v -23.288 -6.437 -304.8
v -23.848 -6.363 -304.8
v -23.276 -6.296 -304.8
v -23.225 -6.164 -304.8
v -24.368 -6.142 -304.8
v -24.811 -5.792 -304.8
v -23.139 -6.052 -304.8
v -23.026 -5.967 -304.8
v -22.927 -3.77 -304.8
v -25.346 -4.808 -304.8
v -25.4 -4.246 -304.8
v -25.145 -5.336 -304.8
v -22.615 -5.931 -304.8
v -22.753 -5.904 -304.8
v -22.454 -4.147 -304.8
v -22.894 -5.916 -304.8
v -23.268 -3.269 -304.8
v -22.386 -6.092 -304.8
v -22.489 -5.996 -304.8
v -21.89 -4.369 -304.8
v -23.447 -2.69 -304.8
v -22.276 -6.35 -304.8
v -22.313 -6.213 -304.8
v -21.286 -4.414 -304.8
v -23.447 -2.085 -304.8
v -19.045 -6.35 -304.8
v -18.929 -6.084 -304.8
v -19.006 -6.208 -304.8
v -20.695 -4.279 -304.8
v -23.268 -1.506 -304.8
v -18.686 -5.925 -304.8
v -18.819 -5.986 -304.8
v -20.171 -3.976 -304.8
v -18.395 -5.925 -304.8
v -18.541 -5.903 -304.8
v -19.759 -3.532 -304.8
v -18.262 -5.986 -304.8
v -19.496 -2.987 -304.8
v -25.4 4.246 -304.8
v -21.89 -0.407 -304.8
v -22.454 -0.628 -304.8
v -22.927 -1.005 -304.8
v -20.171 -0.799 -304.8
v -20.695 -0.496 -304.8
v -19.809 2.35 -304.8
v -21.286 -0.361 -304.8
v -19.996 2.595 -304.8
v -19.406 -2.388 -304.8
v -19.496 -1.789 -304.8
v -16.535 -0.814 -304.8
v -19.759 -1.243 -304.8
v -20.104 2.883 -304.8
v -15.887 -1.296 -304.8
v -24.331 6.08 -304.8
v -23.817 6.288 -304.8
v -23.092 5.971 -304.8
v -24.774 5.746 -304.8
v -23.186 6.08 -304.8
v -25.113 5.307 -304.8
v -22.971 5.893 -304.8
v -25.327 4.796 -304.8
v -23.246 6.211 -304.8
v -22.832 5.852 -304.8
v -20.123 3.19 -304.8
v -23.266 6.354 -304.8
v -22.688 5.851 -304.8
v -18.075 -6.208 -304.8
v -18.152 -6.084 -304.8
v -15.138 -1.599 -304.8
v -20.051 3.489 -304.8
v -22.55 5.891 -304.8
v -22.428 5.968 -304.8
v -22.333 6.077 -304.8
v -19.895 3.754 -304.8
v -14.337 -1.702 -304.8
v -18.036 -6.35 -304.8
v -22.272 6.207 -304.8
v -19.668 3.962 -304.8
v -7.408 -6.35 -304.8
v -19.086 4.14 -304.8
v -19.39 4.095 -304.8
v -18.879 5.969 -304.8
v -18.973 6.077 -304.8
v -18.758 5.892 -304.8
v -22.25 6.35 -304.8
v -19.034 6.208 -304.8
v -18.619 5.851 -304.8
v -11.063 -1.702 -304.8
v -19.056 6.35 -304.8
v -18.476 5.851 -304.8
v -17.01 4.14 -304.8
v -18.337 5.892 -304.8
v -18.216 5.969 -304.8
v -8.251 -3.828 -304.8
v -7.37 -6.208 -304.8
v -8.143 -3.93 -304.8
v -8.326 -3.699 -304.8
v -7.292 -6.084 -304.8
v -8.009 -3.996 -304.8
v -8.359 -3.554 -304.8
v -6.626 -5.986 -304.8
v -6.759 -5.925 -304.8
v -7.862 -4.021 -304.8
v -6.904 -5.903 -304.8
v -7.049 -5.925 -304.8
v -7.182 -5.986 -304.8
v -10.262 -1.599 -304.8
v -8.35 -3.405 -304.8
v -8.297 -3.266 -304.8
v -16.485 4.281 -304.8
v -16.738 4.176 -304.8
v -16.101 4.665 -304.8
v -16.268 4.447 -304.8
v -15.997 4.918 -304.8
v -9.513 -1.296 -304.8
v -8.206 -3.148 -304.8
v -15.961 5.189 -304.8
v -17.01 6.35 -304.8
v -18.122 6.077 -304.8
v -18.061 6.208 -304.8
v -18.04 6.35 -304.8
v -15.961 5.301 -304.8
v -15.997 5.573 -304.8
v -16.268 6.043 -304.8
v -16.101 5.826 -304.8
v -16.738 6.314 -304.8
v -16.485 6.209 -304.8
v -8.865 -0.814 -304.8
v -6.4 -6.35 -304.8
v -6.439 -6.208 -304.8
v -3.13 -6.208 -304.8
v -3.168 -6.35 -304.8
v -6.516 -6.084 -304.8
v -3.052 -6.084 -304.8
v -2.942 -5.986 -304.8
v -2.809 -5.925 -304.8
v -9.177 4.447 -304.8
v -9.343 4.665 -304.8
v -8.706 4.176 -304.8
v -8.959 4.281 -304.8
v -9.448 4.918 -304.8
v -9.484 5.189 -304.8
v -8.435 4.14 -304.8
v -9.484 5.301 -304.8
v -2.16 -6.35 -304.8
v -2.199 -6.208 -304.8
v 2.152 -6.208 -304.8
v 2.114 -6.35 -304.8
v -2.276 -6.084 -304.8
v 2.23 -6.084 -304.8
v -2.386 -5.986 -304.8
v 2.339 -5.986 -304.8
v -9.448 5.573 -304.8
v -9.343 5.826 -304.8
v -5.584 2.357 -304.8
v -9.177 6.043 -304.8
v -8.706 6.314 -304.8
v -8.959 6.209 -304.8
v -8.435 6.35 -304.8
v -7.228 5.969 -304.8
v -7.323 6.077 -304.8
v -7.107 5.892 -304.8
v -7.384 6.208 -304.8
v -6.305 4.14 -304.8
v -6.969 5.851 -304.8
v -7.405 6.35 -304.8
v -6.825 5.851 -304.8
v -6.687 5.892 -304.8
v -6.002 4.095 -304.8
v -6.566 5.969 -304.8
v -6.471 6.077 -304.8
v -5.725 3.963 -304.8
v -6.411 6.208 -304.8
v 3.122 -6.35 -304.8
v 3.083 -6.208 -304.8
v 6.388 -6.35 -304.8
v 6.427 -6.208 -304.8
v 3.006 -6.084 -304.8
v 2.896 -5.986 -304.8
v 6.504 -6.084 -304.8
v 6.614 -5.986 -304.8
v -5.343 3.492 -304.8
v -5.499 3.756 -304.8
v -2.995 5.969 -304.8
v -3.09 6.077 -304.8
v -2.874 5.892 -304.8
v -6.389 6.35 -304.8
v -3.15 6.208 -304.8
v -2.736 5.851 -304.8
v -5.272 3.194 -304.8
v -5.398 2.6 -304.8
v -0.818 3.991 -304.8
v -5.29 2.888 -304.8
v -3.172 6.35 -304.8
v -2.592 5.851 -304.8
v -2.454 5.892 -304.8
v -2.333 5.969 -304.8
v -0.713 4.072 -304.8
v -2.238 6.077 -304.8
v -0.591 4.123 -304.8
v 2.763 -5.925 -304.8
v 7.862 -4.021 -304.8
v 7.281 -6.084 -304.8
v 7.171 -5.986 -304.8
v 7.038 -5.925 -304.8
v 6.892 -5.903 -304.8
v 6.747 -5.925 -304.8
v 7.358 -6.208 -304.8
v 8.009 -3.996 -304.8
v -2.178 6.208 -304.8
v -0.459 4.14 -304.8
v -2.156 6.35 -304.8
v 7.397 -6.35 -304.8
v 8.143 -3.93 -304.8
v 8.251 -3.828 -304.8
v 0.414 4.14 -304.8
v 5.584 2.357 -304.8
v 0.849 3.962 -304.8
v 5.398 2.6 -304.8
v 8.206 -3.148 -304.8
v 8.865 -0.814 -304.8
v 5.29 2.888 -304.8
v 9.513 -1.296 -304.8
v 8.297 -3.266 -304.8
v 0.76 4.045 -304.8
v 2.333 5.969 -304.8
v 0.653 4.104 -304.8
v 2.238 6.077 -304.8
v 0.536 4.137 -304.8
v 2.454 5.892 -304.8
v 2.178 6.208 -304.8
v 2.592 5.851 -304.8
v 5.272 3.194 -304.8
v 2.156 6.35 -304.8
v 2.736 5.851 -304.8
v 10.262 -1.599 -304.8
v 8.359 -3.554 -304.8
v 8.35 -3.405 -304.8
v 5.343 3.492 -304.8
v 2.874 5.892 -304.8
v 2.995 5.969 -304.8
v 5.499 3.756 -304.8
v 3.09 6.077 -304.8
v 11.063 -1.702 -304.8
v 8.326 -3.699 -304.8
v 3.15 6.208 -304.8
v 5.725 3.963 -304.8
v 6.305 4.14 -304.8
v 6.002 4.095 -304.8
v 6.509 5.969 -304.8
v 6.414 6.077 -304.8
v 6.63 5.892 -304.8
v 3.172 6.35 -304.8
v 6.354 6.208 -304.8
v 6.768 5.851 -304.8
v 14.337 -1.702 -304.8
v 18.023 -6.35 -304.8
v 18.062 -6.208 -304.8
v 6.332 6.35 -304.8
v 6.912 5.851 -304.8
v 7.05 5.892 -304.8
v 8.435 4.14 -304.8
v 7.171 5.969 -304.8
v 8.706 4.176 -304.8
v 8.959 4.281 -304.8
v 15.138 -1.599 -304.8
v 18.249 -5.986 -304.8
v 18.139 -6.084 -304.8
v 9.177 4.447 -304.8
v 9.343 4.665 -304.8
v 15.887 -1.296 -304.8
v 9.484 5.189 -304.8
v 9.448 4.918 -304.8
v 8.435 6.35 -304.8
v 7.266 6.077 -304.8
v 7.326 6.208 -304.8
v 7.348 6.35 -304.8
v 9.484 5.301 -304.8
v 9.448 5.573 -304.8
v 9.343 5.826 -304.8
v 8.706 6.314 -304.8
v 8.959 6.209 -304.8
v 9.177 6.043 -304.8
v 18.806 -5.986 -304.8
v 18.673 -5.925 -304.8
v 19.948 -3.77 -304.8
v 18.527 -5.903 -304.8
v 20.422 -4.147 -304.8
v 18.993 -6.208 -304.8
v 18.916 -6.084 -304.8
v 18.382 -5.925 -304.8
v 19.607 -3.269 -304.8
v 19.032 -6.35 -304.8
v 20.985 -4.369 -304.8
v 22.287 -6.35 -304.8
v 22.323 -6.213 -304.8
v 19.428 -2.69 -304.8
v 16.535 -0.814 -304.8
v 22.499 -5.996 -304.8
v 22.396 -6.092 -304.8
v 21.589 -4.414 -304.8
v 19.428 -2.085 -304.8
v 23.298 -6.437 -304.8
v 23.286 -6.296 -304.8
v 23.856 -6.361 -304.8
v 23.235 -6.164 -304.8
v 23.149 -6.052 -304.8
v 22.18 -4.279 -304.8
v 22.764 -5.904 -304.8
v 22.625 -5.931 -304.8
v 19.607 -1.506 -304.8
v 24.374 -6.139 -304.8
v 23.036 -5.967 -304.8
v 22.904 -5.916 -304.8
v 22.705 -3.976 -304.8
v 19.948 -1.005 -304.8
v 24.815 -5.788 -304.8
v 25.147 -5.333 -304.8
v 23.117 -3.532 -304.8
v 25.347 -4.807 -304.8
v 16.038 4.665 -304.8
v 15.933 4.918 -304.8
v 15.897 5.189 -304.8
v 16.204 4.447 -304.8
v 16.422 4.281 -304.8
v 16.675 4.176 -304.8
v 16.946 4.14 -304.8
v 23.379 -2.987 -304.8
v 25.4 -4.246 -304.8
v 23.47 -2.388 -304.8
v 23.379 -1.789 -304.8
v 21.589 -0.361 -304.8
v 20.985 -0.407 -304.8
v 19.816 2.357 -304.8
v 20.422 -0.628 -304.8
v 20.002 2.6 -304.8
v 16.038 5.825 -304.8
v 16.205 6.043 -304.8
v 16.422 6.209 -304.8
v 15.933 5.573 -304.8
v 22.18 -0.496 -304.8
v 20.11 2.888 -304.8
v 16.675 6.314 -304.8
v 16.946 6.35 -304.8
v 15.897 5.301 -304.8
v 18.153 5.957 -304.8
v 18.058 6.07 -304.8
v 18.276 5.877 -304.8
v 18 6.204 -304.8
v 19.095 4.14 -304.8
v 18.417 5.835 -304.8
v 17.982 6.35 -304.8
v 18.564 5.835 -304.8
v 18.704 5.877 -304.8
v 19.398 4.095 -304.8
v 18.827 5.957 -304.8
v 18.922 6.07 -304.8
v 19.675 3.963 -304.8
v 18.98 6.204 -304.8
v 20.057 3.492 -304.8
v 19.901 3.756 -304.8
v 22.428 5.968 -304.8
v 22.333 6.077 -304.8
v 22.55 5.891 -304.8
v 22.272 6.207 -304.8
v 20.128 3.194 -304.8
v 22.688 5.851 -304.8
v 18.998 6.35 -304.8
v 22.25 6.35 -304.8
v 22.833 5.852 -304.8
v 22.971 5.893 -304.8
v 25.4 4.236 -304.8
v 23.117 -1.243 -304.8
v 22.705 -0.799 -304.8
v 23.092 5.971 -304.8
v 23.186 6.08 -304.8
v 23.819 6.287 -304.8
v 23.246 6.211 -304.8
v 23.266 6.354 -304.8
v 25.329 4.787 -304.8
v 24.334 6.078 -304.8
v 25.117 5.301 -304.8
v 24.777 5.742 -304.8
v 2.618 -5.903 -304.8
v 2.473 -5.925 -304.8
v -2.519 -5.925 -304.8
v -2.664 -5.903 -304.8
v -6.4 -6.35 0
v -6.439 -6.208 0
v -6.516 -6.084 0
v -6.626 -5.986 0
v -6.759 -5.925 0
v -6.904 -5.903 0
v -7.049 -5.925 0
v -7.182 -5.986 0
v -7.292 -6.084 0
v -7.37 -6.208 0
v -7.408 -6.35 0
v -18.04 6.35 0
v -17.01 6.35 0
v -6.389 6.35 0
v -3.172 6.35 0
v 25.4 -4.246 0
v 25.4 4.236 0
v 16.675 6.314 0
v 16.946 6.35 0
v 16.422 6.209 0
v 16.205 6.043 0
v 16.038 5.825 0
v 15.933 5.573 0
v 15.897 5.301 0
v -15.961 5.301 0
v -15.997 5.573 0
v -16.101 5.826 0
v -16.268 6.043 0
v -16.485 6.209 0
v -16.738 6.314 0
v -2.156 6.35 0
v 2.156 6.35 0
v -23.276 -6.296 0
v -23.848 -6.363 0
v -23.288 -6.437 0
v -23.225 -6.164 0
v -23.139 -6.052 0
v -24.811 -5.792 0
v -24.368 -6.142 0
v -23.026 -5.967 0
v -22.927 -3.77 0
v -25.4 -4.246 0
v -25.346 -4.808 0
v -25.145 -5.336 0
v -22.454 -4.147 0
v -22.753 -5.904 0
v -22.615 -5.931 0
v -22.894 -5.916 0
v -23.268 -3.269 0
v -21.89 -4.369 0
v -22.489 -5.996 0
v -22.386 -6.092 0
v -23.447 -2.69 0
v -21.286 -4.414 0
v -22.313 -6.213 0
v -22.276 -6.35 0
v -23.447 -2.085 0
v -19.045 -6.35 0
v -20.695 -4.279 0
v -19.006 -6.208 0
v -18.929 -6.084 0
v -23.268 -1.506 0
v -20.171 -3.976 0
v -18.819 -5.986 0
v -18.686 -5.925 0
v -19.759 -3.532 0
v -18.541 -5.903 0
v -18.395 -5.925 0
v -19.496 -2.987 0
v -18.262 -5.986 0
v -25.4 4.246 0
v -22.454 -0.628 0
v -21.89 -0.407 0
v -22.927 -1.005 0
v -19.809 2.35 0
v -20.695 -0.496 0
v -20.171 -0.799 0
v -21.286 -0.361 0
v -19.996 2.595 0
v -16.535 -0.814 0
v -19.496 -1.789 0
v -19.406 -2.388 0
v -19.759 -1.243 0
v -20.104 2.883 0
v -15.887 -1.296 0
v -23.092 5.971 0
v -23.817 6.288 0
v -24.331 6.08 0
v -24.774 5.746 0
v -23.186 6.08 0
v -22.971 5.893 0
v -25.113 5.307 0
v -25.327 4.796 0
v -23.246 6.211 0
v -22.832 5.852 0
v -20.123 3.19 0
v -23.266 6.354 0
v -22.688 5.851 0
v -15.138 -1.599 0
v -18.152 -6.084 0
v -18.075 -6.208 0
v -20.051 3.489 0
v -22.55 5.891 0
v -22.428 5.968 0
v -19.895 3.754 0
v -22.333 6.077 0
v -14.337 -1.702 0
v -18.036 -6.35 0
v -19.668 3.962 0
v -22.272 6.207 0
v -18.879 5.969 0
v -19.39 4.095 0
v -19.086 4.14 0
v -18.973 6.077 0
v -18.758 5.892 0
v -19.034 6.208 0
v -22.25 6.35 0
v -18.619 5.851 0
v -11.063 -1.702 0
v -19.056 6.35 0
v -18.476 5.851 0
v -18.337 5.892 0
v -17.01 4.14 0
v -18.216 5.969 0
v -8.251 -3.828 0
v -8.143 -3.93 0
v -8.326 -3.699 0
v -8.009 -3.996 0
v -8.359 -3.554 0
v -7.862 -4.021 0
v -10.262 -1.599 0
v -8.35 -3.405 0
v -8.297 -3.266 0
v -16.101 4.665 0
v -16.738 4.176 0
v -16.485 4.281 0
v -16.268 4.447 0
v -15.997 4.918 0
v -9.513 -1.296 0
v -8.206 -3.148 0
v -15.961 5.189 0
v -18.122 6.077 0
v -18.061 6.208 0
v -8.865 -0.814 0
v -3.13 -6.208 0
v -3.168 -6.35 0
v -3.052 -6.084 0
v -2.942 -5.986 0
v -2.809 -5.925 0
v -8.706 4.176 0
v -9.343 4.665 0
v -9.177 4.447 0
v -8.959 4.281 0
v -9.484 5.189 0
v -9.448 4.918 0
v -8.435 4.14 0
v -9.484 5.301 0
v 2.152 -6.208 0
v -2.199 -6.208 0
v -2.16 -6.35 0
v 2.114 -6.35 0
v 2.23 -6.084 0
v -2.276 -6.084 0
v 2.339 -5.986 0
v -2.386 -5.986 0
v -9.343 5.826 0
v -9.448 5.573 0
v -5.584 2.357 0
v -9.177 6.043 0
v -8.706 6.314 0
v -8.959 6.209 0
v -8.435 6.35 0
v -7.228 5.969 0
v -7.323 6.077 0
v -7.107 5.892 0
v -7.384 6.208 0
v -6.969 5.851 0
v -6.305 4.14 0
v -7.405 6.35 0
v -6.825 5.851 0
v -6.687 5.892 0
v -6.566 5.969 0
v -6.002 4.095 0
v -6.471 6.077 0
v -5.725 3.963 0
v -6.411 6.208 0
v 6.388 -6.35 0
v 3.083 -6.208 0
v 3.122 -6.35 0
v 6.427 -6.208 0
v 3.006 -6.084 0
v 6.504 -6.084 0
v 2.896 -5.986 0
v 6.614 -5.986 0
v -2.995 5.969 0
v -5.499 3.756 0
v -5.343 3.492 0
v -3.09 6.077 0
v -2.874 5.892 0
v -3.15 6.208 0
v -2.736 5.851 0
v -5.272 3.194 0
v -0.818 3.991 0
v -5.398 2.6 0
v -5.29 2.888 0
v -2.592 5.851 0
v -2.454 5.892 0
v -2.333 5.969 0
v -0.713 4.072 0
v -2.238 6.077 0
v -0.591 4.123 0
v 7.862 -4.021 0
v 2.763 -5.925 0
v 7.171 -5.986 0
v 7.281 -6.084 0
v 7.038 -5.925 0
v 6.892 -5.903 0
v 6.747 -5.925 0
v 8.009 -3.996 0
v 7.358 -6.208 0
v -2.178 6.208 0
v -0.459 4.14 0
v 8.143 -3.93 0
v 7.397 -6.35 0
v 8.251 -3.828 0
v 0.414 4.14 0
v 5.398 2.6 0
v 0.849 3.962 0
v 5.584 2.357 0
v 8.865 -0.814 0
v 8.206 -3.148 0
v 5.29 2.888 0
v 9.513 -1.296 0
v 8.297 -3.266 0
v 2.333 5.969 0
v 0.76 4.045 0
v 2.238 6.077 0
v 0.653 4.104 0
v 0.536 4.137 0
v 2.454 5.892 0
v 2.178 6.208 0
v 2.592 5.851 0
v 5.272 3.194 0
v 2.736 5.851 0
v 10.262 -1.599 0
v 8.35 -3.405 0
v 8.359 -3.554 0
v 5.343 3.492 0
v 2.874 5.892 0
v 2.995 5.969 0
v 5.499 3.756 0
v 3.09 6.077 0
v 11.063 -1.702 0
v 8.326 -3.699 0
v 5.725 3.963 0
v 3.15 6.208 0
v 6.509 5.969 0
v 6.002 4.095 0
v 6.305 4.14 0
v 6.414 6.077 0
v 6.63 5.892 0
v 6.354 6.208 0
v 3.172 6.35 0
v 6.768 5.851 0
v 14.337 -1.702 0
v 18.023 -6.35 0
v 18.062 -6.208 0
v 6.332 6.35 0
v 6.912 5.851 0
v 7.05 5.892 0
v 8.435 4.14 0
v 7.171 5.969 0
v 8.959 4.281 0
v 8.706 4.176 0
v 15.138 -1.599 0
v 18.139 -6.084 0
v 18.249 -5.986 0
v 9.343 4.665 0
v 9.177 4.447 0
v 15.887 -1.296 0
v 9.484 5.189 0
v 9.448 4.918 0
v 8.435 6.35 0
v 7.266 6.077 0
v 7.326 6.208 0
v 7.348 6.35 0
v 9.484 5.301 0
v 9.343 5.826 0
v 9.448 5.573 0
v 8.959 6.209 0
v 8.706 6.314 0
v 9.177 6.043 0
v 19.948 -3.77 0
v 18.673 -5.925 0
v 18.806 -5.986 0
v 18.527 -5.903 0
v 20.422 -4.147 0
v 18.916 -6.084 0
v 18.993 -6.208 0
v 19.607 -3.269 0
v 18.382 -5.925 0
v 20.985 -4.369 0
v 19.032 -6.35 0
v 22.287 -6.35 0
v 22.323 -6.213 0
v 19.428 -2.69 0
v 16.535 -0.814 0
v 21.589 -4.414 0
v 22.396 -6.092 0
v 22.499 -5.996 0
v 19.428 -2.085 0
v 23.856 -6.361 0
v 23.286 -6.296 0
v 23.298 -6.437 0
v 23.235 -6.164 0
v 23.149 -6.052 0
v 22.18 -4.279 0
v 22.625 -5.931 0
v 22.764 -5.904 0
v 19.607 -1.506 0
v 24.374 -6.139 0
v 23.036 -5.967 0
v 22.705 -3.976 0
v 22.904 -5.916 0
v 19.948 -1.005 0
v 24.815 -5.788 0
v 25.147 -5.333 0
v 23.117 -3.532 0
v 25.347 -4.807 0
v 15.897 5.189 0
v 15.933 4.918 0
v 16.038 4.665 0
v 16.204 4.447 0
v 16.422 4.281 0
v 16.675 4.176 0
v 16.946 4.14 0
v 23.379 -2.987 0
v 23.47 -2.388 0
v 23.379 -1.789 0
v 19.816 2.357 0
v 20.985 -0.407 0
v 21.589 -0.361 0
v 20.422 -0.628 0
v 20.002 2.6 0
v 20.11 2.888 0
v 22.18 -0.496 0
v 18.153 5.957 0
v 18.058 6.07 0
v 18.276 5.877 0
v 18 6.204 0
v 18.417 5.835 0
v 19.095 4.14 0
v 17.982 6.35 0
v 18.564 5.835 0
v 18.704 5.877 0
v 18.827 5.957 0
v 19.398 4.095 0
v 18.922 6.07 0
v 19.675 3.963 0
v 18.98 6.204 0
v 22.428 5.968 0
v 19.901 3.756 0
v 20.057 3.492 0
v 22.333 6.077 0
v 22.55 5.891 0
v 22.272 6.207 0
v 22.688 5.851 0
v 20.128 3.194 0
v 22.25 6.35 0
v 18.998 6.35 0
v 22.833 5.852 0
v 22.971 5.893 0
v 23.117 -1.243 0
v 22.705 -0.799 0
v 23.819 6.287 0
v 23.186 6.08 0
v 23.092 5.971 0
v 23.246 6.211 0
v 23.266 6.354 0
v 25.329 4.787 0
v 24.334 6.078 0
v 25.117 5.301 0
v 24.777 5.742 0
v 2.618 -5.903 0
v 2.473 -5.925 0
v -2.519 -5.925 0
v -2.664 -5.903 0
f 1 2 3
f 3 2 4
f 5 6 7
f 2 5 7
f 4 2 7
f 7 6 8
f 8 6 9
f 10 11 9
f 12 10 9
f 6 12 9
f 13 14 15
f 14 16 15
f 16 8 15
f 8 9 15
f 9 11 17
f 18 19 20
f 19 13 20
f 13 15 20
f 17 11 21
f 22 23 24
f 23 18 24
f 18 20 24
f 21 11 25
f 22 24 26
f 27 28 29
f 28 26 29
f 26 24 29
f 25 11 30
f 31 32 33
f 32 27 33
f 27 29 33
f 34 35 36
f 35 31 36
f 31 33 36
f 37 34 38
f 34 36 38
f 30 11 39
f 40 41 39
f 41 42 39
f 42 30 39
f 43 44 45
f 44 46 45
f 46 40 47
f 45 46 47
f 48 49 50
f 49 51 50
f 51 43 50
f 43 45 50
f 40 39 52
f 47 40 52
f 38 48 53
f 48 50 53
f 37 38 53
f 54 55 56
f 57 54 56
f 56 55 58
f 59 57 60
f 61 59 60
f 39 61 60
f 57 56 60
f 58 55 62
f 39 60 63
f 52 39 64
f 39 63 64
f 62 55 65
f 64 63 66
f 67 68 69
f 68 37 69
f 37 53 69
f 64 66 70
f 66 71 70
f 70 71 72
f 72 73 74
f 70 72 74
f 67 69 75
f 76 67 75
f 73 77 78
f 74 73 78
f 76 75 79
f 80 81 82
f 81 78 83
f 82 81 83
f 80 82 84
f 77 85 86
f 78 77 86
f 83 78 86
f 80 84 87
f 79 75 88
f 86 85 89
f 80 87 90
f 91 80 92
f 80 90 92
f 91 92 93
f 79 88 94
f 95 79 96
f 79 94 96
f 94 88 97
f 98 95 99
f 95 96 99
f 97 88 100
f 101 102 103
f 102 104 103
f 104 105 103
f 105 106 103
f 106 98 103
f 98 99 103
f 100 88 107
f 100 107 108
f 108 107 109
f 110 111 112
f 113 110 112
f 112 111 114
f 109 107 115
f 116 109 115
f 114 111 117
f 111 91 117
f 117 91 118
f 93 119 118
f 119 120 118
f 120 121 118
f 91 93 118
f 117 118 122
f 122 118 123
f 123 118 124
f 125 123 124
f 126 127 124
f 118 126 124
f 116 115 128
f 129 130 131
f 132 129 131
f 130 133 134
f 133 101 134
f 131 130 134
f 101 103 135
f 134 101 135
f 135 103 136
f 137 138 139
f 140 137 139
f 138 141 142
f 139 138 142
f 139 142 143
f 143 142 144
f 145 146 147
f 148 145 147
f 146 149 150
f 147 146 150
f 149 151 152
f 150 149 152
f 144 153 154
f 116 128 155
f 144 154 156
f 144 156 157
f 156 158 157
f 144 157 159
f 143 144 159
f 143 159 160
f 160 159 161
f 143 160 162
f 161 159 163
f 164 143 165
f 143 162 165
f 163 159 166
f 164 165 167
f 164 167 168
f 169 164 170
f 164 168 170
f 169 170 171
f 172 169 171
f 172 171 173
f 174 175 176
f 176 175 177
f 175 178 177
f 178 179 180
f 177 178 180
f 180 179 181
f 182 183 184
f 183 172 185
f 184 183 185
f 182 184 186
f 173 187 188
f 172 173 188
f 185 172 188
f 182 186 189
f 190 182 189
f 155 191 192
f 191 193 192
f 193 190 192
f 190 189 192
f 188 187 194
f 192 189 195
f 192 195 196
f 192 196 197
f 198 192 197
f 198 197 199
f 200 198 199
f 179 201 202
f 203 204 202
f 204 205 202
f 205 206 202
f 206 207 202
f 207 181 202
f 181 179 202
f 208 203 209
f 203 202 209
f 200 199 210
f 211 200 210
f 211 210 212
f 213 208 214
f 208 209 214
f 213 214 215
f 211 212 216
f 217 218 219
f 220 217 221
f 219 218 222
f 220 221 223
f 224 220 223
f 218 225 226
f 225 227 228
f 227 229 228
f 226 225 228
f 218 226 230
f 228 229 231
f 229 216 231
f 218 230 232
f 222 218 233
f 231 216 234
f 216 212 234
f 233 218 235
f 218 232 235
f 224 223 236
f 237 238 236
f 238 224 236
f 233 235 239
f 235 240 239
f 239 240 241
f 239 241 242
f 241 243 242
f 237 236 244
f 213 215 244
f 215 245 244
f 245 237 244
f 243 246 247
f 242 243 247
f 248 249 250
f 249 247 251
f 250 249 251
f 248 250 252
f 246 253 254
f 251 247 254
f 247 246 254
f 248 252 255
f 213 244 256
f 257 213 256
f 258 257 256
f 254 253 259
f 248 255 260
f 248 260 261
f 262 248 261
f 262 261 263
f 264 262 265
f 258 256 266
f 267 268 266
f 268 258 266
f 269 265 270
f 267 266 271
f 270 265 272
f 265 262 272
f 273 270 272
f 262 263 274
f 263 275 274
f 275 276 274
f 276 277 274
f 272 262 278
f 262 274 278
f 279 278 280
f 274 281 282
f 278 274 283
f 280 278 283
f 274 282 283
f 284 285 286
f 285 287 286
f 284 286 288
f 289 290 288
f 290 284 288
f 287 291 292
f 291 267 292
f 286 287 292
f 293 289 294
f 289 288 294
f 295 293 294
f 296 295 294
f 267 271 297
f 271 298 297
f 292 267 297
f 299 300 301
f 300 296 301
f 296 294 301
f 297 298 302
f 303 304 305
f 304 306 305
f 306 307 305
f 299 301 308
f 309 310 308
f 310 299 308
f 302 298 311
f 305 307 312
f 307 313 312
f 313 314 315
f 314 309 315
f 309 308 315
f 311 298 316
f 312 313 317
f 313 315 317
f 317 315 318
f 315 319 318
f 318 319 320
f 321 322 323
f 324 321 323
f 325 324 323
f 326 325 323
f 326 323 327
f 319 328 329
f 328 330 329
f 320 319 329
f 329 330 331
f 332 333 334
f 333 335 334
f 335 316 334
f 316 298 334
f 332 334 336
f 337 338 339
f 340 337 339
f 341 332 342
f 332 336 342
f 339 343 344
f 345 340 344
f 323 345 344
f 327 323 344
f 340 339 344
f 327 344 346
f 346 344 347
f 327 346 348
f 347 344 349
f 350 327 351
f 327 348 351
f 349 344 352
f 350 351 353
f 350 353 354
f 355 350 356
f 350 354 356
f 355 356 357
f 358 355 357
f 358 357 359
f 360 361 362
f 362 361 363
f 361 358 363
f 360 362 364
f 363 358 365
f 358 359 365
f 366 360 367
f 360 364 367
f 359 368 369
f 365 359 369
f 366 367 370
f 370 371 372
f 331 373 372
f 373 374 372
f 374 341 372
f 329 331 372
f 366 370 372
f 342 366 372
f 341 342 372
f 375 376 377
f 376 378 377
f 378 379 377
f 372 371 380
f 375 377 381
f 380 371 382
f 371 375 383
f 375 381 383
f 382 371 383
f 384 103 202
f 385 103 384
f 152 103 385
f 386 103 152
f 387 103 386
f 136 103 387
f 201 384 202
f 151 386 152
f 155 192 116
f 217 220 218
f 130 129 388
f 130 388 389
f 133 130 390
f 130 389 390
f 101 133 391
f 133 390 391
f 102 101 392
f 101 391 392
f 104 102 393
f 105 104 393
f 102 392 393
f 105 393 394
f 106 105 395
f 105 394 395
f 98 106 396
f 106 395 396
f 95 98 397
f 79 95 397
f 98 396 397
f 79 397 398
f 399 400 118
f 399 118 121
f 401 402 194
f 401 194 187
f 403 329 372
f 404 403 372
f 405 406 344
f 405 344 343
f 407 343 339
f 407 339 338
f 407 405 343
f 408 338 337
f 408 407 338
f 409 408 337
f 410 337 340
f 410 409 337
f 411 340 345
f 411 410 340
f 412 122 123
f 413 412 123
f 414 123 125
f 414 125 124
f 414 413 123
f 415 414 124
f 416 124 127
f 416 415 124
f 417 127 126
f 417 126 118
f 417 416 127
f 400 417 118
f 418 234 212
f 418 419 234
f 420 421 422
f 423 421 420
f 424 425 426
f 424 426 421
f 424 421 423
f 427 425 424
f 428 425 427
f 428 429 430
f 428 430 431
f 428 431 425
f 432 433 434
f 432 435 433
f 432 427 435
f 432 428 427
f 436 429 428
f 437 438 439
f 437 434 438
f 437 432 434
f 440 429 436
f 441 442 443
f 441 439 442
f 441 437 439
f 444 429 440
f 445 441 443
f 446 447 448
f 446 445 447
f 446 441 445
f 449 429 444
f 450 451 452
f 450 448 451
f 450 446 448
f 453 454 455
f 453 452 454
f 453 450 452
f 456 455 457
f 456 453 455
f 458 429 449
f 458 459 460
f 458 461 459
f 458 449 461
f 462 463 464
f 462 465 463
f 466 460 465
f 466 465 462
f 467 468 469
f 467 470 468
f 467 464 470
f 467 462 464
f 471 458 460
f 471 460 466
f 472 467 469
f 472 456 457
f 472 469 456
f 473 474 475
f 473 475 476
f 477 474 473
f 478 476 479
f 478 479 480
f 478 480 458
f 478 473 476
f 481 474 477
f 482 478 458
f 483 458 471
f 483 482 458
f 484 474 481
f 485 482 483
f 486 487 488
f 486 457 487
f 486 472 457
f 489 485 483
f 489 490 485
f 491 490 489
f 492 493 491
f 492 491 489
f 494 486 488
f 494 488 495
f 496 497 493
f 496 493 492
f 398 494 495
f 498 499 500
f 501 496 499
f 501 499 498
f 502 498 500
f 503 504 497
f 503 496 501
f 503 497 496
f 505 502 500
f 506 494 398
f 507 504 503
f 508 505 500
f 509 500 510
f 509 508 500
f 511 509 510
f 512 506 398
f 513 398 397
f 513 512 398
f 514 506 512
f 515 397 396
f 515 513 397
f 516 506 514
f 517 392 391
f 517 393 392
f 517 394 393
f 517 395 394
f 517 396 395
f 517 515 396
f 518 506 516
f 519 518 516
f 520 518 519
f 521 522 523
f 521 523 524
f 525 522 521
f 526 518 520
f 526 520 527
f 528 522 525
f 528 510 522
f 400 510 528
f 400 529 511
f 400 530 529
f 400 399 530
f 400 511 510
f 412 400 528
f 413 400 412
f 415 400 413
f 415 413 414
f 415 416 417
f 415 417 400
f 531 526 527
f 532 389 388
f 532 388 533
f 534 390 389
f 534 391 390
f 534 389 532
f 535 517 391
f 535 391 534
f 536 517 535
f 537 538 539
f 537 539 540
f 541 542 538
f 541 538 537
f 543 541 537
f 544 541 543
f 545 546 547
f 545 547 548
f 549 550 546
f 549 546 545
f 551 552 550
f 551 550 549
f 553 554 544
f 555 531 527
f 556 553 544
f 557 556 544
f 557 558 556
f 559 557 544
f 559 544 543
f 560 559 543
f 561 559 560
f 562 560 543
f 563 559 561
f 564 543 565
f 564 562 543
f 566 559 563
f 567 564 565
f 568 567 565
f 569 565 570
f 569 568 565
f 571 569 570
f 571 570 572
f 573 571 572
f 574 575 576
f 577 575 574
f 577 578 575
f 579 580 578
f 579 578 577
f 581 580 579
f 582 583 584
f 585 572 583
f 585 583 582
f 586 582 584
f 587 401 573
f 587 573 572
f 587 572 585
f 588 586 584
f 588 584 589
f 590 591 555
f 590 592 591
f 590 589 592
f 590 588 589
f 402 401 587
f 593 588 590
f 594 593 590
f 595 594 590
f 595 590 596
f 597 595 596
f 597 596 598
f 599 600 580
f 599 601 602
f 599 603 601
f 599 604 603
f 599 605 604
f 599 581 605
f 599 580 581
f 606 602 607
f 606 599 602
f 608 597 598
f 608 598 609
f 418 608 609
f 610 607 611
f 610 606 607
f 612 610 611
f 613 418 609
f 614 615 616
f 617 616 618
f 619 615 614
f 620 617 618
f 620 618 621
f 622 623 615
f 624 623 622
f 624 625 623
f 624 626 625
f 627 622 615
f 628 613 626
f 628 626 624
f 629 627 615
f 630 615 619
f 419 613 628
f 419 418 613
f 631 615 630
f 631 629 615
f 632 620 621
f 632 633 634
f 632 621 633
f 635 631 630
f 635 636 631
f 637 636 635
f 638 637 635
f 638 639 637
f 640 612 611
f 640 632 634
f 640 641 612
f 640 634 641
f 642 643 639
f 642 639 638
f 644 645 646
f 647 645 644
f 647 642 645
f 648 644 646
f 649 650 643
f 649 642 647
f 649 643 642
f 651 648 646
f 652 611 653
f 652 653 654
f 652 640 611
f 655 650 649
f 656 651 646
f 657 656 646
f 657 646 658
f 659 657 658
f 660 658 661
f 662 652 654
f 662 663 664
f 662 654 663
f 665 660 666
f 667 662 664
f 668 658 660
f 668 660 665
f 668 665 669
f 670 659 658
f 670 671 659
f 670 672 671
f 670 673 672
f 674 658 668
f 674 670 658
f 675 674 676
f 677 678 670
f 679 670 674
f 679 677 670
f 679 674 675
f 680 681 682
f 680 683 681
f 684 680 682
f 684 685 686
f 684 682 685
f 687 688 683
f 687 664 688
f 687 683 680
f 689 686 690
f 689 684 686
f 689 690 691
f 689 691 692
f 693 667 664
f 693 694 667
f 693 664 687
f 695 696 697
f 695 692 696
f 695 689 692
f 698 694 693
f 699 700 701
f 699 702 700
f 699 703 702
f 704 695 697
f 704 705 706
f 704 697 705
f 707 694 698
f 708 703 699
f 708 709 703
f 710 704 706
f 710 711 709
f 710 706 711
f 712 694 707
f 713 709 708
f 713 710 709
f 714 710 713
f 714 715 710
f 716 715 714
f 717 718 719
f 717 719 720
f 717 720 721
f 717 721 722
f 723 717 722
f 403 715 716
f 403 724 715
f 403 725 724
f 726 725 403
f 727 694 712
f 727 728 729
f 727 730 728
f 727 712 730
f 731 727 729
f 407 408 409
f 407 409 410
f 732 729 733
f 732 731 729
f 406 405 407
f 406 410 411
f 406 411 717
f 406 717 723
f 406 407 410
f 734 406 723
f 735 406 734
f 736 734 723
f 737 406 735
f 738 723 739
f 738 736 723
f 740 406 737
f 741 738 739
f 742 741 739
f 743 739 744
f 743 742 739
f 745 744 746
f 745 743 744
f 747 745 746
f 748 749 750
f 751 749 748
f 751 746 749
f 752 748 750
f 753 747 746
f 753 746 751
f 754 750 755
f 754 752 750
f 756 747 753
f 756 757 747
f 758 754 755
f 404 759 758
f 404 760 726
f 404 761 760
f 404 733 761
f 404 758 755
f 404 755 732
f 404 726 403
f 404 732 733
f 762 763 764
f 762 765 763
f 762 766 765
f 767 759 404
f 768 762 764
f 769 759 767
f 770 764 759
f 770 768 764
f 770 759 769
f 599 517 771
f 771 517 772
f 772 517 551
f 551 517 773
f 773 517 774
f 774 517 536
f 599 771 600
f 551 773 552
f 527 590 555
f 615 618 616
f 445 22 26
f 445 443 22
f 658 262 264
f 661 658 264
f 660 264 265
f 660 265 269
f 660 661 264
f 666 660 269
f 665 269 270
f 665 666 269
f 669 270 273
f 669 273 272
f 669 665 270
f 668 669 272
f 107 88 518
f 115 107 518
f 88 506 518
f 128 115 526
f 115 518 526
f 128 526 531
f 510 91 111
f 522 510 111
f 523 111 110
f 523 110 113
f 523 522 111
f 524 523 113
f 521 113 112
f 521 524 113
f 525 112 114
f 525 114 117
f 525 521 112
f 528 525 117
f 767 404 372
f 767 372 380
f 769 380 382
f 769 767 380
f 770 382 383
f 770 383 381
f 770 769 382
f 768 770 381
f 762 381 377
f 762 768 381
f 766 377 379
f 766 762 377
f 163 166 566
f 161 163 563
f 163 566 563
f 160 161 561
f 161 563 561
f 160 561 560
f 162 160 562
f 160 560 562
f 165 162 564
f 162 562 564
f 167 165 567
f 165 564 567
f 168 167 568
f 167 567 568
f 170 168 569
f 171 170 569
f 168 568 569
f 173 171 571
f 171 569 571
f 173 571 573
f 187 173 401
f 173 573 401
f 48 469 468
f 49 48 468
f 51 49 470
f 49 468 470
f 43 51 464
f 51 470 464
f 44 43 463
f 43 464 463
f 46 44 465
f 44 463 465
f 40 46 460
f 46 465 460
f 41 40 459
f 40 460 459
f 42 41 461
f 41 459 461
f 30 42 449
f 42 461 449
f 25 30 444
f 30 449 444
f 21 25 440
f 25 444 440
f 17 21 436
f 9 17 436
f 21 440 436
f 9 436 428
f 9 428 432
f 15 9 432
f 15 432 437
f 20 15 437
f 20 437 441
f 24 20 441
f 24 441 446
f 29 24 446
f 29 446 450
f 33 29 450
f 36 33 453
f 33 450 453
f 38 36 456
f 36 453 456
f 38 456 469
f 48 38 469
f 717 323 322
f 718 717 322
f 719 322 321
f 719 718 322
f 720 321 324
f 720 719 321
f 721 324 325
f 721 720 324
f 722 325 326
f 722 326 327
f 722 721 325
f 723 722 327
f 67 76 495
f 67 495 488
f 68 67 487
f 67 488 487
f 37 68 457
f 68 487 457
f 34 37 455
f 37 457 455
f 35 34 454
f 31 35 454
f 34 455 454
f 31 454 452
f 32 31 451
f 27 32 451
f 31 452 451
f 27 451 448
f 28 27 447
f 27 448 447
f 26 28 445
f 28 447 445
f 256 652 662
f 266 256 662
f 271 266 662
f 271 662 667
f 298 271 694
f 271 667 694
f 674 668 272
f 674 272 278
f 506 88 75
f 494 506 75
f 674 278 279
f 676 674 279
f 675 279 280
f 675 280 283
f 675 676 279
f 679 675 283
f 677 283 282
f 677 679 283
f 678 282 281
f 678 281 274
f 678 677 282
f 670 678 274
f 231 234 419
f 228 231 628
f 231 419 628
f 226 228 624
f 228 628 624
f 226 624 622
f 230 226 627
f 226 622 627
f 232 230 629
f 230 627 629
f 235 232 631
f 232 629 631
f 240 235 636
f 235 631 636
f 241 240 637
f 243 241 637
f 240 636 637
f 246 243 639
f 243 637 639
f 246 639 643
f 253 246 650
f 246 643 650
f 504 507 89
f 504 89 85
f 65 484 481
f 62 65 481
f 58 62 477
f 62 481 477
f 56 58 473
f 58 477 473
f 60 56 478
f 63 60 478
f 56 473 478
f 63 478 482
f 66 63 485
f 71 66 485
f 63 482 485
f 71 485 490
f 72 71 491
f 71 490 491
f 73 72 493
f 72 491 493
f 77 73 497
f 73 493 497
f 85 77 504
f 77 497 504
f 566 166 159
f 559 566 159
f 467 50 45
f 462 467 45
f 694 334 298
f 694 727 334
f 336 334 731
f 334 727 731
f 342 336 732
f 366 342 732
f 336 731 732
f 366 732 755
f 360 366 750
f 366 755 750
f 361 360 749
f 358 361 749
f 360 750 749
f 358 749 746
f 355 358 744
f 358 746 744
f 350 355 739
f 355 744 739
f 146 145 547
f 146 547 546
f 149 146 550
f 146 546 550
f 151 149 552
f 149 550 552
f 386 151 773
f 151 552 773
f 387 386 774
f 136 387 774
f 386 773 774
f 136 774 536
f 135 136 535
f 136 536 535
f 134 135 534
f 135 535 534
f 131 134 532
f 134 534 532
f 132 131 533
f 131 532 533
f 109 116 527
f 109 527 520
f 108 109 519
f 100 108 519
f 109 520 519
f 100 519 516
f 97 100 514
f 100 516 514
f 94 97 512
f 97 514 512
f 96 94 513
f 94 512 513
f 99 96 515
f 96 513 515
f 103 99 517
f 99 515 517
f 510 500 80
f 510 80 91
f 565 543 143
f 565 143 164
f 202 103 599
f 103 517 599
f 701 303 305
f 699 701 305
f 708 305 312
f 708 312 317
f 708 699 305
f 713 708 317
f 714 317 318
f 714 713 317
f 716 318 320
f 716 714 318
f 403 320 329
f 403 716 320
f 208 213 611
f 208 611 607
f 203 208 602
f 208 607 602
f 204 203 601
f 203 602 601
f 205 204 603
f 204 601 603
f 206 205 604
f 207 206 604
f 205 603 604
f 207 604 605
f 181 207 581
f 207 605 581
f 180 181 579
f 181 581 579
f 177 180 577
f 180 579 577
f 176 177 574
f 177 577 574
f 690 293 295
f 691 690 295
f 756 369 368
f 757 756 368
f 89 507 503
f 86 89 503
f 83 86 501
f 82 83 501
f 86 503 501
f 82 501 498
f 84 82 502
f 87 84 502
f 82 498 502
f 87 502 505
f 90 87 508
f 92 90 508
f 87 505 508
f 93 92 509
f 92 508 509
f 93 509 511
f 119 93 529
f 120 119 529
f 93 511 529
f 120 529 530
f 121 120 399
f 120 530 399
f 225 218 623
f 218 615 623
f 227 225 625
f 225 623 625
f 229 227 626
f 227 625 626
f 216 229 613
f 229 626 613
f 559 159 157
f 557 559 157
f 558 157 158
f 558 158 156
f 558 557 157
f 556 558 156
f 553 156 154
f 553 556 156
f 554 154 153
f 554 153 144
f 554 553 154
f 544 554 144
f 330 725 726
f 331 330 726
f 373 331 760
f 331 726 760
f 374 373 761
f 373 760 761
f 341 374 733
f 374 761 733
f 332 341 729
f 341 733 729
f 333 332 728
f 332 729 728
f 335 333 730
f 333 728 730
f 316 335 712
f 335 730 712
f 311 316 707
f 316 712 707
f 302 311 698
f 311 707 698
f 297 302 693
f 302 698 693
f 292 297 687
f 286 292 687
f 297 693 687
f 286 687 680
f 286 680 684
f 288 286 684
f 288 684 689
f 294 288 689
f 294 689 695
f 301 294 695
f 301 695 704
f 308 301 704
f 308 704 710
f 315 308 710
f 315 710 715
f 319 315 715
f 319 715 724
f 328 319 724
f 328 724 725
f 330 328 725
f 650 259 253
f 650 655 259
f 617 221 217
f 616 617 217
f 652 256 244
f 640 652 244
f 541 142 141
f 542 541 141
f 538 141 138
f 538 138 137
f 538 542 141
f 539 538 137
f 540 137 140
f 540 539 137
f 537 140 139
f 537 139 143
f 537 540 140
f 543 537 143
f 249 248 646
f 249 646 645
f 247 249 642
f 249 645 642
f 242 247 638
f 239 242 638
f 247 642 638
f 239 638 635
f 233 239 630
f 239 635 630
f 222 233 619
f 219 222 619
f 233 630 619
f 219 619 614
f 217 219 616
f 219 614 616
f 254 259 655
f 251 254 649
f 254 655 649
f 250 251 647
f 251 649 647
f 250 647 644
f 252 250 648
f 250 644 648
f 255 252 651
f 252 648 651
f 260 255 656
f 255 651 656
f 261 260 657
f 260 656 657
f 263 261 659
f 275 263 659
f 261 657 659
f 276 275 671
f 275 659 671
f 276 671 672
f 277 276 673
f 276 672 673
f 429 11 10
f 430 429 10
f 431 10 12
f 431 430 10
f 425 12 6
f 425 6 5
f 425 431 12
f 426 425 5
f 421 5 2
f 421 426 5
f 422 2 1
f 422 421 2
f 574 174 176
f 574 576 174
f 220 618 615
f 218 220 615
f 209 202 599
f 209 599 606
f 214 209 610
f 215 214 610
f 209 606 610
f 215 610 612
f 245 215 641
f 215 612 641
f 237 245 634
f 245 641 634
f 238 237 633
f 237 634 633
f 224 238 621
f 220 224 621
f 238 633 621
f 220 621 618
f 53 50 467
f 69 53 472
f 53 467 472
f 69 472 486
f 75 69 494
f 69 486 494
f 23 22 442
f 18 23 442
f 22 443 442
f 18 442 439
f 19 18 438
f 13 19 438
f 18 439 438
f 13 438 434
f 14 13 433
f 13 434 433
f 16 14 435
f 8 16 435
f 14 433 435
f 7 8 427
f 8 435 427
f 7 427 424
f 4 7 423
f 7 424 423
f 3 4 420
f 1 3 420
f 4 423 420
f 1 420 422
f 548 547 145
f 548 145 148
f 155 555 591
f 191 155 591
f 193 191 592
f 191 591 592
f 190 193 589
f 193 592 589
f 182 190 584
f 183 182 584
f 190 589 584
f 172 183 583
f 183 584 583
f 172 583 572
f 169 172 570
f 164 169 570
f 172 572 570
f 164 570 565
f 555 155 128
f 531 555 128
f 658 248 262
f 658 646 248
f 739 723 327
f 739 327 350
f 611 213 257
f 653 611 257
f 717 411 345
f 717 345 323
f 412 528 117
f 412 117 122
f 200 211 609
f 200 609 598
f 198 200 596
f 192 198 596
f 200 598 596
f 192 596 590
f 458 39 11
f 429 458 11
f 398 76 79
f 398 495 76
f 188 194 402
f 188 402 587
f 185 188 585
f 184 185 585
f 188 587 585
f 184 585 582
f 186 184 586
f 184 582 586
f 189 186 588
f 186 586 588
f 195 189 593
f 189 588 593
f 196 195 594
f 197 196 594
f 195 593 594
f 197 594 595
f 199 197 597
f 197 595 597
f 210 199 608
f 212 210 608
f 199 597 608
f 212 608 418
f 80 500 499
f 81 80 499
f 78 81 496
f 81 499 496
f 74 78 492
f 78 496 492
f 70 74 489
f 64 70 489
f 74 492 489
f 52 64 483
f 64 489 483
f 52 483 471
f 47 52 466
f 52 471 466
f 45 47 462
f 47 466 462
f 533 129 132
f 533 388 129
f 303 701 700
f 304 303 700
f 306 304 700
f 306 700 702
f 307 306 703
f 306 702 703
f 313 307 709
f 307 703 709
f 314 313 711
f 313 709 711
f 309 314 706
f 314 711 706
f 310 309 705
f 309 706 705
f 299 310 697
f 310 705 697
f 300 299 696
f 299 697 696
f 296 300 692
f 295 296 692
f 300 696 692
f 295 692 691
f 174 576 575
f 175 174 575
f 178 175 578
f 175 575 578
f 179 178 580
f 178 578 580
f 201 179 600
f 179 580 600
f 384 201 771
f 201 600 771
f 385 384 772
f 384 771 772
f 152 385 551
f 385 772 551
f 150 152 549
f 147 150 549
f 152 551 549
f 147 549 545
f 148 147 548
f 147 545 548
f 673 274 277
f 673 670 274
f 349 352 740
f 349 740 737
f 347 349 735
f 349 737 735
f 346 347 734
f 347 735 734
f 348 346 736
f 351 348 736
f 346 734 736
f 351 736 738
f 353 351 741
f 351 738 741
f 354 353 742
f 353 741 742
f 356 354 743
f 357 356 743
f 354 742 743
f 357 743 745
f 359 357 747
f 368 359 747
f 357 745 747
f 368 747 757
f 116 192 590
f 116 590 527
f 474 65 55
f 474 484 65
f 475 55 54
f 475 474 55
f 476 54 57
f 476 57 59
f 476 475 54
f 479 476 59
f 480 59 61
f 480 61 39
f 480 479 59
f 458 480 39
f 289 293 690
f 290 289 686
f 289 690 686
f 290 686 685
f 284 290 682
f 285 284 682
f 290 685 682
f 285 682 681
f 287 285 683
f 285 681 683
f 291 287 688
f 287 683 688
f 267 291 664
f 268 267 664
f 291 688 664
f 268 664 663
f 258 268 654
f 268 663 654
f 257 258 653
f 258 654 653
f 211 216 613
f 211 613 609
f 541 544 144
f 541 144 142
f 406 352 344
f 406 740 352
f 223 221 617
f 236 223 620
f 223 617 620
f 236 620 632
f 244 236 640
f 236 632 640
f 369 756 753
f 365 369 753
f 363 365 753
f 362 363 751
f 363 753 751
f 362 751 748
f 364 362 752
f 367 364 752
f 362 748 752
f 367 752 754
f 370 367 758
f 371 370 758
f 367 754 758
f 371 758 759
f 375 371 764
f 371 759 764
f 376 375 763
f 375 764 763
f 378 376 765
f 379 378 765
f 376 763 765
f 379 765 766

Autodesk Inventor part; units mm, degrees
ref_plane "YZ Plane" through (0, 0, 0) normal (1, 0, 0) x (0, 1, 0)
ref_plane "XZ Plane" through (0, 0, 0) normal (0, 1, 0) x (-1, 0, 0)
ref_plane "XY Plane" through (0, 0, 0) normal (0, 0, 1) x (1, 0, 0)
sketch "Sketch1" plane through (0, 0, 0) normal (0, 0, 1) x (1, 0, 0)
  arc A0 (-8.2061, -3.1475) -> (-7.8618, -4.0207) centre (-7.8531, -3.5128) ccw
  line L0 (-0.8184, 3.9914) -> (-8.2061, -3.1475)
  arc A1 (-0.4592, 4.1402) -> (-0.8184, 3.9914) centre (-0.4592, 3.6322) ccw
  line L1 (0.4145, 4.1402) -> (-0.4592, 4.1402)
  arc A2 (0.8488, 3.962) -> (0.4145, 4.1402) centre (0.4606, 3.6343) ccw
  line L2 (8.2061, -3.1475) -> (0.8488, 3.962)
  arc A3 (7.8618, -4.0207) -> (8.2061, -3.1475) centre (7.8531, -3.5128) ccw
  line L3 (-7.8618, -4.0207) -> (7.8618, -4.0207)
  circle A4 centre (21.4376, -2.3876) radius 2.032
  circle A5 centre (-21.4376, -2.3876) radius 2.032
  arc A6 (16.9463, 6.35) -> (15.8972, 5.301) centre (16.9463, 5.301) ccw
  line L4 (15.8972, 5.301) -> (15.8972, 5.1892)
  arc A7 (15.8972, 5.1892) -> (16.9463, 4.1402) centre (16.9463, 5.1892) ccw
  line L5 (16.9463, 4.1402) -> (19.0952, 4.1402)
  arc A8 (19.8159, 2.3571) -> (19.0952, 4.1402) centre (19.0952, 3.103) ccw
  line L6 (19.8159, 2.3571) -> (16.5346, -0.8136)
  arc A9 (14.3374, -1.7018) -> (16.5346, -0.8136) centre (14.3374, 1.4602) ccw
  line L7 (14.3374, -1.7018) -> (11.0626, -1.7018)
  arc A10 (8.8654, -0.8136) -> (11.0626, -1.7018) centre (11.0626, 1.4602) ccw
  line L8 (8.8654, -0.8136) -> (5.5841, 2.3571)
  arc A11 (6.3048, 4.1402) -> (5.5841, 2.3571) centre (6.3048, 3.103) ccw
  line L9 (6.3048, 4.1402) -> (8.4349, 4.1402)
  arc A12 (8.4349, 4.1402) -> (9.4839, 5.1892) centre (8.4349, 5.1892) ccw
  line L10 (9.4839, 5.1892) -> (9.4839, 5.301)
  arc A13 (9.4839, 5.301) -> (8.4349, 6.35) centre (8.4349, 5.301) ccw
  line L11 (8.4349, 6.35) -> (7.3479, 6.35)
  arc A14 (6.332, 6.35) -> (7.3479, 6.35) centre (6.8399, 6.3541) ccw
  line L12 (6.332, 6.35) -> (3.1719, 6.35)
  arc A15 (2.156, 6.35) -> (3.1719, 6.35) centre (2.6639, 6.3541) ccw
  line L13 (2.156, 6.35) -> (-2.156, 6.35)
  arc A16 (-3.1719, 6.35) -> (-2.156, 6.35) centre (-2.6639, 6.3541) ccw
  line L14 (-3.1719, 6.35) -> (-6.3893, 6.35)
  arc A17 (-7.4052, 6.35) -> (-6.3893, 6.35) centre (-6.8973, 6.3541) ccw
  line L15 (-7.4052, 6.35) -> (-8.4349, 6.35)
  arc A18 (-8.4349, 6.35) -> (-9.4839, 5.301) centre (-8.4349, 5.301) ccw
  line L16 (-9.4839, 5.301) -> (-9.4839, 5.1892)
  arc A19 (-9.4839, 5.1892) -> (-8.4349, 4.1402) centre (-8.4349, 5.1892) ccw
  line L17 (-8.4349, 4.1402) -> (-6.3048, 4.1402)
  arc A20 (-5.5841, 2.3571) -> (-6.3048, 4.1402) centre (-6.3048, 3.103) ccw
  line L18 (-5.5841, 2.3571) -> (-8.8654, -0.8136)
  arc A21 (-11.0626, -1.7018) -> (-8.8654, -0.8136) centre (-11.0626, 1.4602) ccw
  line L19 (-11.0626, -1.7018) -> (-14.3374, -1.7018)
  arc A22 (-16.5346, -0.8136) -> (-14.3374, -1.7018) centre (-14.3374, 1.4602) ccw
  line L20 (-16.5346, -0.8136) -> (-19.809, 2.3504)
  arc A23 (-19.0855, 4.1402) -> (-19.809, 2.3504) centre (-19.0855, 3.0991) ccw
  line L21 (-19.0855, 4.1402) -> (-17.0099, 4.1402)
  arc A24 (-17.0099, 4.1402) -> (-15.9609, 5.1892) centre (-17.0099, 5.1892) ccw
  line L22 (-15.9609, 5.1892) -> (-15.9609, 5.301)
  arc A25 (-15.9609, 5.301) -> (-17.0099, 6.35) centre (-17.0099, 5.301) ccw
  line L23 (-17.0099, 6.35) -> (-18.0395, 6.35)
  arc A26 (-19.0555, 6.35) -> (-18.0395, 6.35) centre (-18.5475, 6.3541) ccw
  line L24 (-19.0555, 6.35) -> (-22.2504, 6.35)
  arc A27 (-23.2664, 6.354) -> (-22.2504, 6.35) centre (-22.7584, 6.3541) ccw
  arc A28 (-23.2664, 6.354) -> (-25.4, 4.2459) centre (-23.2918, 4.2459) ccw
  line L25 (-25.4, 4.2459) -> (-25.4, -4.2459)
  arc A29 (-25.4, -4.2459) -> (-23.2881, -6.4371) centre (-23.2933, -4.3288) ccw
  arc A30 (-22.2765, -6.35) -> (-23.2881, -6.4371) centre (-22.7808, -6.4114) ccw
  line L26 (-22.2765, -6.35) -> (-19.0448, -6.35)
  arc A31 (-18.0363, -6.35) -> (-19.0448, -6.35) centre (-18.5406, -6.4114) ccw
  line L27 (-18.0363, -6.35) -> (-7.4084, -6.35)
  arc A32 (-6.3999, -6.35) -> (-7.4084, -6.35) centre (-6.9041, -6.4114) ccw
  line L28 (-6.3999, -6.35) -> (-3.1684, -6.35)
  arc A33 (-2.1599, -6.35) -> (-3.1684, -6.35) centre (-2.6641, -6.4114) ccw
  line L29 (-2.1599, -6.35) -> (2.1135, -6.35)
  arc A34 (3.122, -6.35) -> (2.1135, -6.35) centre (2.6177, -6.4114) ccw
  line L30 (3.122, -6.35) -> (6.3882, -6.35)
  arc A35 (7.3967, -6.35) -> (6.3882, -6.35) centre (6.8925, -6.4114) ccw
  line L31 (7.3967, -6.35) -> (18.0231, -6.35)
  arc A36 (19.0317, -6.35) -> (18.0231, -6.35) centre (18.5274, -6.4114) ccw
  line L32 (19.0317, -6.35) -> (22.2866, -6.35)
  arc A37 (23.2982, -6.4371) -> (22.2866, -6.35) centre (22.7909, -6.4114) ccw
  arc A38 (23.2982, -6.4371) -> (25.4, -4.2459) centre (23.2933, -4.3288) ccw
  line L33 (25.4, -4.2459) -> (25.4, 4.2355)
  arc A39 (25.4, 4.2355) -> (23.2665, 6.354) centre (23.2918, 4.2459) ccw
  arc A40 (22.2505, 6.35) -> (23.2665, 6.354) centre (22.7585, 6.3541) ccw
  line L34 (22.2505, 6.35) -> (18.998, 6.35)
  arc A41 (17.9823, 6.35) -> (18.998, 6.35) centre (18.4902, 6.3374) ccw
  line L35 (17.9823, 6.35) -> (16.9463, 6.35)
  point P0 (0, 0)
extrude "Extrusion1" add sketch "Sketch1" against normal blind 304.8
properties part number "2012-BLACK-FB"
